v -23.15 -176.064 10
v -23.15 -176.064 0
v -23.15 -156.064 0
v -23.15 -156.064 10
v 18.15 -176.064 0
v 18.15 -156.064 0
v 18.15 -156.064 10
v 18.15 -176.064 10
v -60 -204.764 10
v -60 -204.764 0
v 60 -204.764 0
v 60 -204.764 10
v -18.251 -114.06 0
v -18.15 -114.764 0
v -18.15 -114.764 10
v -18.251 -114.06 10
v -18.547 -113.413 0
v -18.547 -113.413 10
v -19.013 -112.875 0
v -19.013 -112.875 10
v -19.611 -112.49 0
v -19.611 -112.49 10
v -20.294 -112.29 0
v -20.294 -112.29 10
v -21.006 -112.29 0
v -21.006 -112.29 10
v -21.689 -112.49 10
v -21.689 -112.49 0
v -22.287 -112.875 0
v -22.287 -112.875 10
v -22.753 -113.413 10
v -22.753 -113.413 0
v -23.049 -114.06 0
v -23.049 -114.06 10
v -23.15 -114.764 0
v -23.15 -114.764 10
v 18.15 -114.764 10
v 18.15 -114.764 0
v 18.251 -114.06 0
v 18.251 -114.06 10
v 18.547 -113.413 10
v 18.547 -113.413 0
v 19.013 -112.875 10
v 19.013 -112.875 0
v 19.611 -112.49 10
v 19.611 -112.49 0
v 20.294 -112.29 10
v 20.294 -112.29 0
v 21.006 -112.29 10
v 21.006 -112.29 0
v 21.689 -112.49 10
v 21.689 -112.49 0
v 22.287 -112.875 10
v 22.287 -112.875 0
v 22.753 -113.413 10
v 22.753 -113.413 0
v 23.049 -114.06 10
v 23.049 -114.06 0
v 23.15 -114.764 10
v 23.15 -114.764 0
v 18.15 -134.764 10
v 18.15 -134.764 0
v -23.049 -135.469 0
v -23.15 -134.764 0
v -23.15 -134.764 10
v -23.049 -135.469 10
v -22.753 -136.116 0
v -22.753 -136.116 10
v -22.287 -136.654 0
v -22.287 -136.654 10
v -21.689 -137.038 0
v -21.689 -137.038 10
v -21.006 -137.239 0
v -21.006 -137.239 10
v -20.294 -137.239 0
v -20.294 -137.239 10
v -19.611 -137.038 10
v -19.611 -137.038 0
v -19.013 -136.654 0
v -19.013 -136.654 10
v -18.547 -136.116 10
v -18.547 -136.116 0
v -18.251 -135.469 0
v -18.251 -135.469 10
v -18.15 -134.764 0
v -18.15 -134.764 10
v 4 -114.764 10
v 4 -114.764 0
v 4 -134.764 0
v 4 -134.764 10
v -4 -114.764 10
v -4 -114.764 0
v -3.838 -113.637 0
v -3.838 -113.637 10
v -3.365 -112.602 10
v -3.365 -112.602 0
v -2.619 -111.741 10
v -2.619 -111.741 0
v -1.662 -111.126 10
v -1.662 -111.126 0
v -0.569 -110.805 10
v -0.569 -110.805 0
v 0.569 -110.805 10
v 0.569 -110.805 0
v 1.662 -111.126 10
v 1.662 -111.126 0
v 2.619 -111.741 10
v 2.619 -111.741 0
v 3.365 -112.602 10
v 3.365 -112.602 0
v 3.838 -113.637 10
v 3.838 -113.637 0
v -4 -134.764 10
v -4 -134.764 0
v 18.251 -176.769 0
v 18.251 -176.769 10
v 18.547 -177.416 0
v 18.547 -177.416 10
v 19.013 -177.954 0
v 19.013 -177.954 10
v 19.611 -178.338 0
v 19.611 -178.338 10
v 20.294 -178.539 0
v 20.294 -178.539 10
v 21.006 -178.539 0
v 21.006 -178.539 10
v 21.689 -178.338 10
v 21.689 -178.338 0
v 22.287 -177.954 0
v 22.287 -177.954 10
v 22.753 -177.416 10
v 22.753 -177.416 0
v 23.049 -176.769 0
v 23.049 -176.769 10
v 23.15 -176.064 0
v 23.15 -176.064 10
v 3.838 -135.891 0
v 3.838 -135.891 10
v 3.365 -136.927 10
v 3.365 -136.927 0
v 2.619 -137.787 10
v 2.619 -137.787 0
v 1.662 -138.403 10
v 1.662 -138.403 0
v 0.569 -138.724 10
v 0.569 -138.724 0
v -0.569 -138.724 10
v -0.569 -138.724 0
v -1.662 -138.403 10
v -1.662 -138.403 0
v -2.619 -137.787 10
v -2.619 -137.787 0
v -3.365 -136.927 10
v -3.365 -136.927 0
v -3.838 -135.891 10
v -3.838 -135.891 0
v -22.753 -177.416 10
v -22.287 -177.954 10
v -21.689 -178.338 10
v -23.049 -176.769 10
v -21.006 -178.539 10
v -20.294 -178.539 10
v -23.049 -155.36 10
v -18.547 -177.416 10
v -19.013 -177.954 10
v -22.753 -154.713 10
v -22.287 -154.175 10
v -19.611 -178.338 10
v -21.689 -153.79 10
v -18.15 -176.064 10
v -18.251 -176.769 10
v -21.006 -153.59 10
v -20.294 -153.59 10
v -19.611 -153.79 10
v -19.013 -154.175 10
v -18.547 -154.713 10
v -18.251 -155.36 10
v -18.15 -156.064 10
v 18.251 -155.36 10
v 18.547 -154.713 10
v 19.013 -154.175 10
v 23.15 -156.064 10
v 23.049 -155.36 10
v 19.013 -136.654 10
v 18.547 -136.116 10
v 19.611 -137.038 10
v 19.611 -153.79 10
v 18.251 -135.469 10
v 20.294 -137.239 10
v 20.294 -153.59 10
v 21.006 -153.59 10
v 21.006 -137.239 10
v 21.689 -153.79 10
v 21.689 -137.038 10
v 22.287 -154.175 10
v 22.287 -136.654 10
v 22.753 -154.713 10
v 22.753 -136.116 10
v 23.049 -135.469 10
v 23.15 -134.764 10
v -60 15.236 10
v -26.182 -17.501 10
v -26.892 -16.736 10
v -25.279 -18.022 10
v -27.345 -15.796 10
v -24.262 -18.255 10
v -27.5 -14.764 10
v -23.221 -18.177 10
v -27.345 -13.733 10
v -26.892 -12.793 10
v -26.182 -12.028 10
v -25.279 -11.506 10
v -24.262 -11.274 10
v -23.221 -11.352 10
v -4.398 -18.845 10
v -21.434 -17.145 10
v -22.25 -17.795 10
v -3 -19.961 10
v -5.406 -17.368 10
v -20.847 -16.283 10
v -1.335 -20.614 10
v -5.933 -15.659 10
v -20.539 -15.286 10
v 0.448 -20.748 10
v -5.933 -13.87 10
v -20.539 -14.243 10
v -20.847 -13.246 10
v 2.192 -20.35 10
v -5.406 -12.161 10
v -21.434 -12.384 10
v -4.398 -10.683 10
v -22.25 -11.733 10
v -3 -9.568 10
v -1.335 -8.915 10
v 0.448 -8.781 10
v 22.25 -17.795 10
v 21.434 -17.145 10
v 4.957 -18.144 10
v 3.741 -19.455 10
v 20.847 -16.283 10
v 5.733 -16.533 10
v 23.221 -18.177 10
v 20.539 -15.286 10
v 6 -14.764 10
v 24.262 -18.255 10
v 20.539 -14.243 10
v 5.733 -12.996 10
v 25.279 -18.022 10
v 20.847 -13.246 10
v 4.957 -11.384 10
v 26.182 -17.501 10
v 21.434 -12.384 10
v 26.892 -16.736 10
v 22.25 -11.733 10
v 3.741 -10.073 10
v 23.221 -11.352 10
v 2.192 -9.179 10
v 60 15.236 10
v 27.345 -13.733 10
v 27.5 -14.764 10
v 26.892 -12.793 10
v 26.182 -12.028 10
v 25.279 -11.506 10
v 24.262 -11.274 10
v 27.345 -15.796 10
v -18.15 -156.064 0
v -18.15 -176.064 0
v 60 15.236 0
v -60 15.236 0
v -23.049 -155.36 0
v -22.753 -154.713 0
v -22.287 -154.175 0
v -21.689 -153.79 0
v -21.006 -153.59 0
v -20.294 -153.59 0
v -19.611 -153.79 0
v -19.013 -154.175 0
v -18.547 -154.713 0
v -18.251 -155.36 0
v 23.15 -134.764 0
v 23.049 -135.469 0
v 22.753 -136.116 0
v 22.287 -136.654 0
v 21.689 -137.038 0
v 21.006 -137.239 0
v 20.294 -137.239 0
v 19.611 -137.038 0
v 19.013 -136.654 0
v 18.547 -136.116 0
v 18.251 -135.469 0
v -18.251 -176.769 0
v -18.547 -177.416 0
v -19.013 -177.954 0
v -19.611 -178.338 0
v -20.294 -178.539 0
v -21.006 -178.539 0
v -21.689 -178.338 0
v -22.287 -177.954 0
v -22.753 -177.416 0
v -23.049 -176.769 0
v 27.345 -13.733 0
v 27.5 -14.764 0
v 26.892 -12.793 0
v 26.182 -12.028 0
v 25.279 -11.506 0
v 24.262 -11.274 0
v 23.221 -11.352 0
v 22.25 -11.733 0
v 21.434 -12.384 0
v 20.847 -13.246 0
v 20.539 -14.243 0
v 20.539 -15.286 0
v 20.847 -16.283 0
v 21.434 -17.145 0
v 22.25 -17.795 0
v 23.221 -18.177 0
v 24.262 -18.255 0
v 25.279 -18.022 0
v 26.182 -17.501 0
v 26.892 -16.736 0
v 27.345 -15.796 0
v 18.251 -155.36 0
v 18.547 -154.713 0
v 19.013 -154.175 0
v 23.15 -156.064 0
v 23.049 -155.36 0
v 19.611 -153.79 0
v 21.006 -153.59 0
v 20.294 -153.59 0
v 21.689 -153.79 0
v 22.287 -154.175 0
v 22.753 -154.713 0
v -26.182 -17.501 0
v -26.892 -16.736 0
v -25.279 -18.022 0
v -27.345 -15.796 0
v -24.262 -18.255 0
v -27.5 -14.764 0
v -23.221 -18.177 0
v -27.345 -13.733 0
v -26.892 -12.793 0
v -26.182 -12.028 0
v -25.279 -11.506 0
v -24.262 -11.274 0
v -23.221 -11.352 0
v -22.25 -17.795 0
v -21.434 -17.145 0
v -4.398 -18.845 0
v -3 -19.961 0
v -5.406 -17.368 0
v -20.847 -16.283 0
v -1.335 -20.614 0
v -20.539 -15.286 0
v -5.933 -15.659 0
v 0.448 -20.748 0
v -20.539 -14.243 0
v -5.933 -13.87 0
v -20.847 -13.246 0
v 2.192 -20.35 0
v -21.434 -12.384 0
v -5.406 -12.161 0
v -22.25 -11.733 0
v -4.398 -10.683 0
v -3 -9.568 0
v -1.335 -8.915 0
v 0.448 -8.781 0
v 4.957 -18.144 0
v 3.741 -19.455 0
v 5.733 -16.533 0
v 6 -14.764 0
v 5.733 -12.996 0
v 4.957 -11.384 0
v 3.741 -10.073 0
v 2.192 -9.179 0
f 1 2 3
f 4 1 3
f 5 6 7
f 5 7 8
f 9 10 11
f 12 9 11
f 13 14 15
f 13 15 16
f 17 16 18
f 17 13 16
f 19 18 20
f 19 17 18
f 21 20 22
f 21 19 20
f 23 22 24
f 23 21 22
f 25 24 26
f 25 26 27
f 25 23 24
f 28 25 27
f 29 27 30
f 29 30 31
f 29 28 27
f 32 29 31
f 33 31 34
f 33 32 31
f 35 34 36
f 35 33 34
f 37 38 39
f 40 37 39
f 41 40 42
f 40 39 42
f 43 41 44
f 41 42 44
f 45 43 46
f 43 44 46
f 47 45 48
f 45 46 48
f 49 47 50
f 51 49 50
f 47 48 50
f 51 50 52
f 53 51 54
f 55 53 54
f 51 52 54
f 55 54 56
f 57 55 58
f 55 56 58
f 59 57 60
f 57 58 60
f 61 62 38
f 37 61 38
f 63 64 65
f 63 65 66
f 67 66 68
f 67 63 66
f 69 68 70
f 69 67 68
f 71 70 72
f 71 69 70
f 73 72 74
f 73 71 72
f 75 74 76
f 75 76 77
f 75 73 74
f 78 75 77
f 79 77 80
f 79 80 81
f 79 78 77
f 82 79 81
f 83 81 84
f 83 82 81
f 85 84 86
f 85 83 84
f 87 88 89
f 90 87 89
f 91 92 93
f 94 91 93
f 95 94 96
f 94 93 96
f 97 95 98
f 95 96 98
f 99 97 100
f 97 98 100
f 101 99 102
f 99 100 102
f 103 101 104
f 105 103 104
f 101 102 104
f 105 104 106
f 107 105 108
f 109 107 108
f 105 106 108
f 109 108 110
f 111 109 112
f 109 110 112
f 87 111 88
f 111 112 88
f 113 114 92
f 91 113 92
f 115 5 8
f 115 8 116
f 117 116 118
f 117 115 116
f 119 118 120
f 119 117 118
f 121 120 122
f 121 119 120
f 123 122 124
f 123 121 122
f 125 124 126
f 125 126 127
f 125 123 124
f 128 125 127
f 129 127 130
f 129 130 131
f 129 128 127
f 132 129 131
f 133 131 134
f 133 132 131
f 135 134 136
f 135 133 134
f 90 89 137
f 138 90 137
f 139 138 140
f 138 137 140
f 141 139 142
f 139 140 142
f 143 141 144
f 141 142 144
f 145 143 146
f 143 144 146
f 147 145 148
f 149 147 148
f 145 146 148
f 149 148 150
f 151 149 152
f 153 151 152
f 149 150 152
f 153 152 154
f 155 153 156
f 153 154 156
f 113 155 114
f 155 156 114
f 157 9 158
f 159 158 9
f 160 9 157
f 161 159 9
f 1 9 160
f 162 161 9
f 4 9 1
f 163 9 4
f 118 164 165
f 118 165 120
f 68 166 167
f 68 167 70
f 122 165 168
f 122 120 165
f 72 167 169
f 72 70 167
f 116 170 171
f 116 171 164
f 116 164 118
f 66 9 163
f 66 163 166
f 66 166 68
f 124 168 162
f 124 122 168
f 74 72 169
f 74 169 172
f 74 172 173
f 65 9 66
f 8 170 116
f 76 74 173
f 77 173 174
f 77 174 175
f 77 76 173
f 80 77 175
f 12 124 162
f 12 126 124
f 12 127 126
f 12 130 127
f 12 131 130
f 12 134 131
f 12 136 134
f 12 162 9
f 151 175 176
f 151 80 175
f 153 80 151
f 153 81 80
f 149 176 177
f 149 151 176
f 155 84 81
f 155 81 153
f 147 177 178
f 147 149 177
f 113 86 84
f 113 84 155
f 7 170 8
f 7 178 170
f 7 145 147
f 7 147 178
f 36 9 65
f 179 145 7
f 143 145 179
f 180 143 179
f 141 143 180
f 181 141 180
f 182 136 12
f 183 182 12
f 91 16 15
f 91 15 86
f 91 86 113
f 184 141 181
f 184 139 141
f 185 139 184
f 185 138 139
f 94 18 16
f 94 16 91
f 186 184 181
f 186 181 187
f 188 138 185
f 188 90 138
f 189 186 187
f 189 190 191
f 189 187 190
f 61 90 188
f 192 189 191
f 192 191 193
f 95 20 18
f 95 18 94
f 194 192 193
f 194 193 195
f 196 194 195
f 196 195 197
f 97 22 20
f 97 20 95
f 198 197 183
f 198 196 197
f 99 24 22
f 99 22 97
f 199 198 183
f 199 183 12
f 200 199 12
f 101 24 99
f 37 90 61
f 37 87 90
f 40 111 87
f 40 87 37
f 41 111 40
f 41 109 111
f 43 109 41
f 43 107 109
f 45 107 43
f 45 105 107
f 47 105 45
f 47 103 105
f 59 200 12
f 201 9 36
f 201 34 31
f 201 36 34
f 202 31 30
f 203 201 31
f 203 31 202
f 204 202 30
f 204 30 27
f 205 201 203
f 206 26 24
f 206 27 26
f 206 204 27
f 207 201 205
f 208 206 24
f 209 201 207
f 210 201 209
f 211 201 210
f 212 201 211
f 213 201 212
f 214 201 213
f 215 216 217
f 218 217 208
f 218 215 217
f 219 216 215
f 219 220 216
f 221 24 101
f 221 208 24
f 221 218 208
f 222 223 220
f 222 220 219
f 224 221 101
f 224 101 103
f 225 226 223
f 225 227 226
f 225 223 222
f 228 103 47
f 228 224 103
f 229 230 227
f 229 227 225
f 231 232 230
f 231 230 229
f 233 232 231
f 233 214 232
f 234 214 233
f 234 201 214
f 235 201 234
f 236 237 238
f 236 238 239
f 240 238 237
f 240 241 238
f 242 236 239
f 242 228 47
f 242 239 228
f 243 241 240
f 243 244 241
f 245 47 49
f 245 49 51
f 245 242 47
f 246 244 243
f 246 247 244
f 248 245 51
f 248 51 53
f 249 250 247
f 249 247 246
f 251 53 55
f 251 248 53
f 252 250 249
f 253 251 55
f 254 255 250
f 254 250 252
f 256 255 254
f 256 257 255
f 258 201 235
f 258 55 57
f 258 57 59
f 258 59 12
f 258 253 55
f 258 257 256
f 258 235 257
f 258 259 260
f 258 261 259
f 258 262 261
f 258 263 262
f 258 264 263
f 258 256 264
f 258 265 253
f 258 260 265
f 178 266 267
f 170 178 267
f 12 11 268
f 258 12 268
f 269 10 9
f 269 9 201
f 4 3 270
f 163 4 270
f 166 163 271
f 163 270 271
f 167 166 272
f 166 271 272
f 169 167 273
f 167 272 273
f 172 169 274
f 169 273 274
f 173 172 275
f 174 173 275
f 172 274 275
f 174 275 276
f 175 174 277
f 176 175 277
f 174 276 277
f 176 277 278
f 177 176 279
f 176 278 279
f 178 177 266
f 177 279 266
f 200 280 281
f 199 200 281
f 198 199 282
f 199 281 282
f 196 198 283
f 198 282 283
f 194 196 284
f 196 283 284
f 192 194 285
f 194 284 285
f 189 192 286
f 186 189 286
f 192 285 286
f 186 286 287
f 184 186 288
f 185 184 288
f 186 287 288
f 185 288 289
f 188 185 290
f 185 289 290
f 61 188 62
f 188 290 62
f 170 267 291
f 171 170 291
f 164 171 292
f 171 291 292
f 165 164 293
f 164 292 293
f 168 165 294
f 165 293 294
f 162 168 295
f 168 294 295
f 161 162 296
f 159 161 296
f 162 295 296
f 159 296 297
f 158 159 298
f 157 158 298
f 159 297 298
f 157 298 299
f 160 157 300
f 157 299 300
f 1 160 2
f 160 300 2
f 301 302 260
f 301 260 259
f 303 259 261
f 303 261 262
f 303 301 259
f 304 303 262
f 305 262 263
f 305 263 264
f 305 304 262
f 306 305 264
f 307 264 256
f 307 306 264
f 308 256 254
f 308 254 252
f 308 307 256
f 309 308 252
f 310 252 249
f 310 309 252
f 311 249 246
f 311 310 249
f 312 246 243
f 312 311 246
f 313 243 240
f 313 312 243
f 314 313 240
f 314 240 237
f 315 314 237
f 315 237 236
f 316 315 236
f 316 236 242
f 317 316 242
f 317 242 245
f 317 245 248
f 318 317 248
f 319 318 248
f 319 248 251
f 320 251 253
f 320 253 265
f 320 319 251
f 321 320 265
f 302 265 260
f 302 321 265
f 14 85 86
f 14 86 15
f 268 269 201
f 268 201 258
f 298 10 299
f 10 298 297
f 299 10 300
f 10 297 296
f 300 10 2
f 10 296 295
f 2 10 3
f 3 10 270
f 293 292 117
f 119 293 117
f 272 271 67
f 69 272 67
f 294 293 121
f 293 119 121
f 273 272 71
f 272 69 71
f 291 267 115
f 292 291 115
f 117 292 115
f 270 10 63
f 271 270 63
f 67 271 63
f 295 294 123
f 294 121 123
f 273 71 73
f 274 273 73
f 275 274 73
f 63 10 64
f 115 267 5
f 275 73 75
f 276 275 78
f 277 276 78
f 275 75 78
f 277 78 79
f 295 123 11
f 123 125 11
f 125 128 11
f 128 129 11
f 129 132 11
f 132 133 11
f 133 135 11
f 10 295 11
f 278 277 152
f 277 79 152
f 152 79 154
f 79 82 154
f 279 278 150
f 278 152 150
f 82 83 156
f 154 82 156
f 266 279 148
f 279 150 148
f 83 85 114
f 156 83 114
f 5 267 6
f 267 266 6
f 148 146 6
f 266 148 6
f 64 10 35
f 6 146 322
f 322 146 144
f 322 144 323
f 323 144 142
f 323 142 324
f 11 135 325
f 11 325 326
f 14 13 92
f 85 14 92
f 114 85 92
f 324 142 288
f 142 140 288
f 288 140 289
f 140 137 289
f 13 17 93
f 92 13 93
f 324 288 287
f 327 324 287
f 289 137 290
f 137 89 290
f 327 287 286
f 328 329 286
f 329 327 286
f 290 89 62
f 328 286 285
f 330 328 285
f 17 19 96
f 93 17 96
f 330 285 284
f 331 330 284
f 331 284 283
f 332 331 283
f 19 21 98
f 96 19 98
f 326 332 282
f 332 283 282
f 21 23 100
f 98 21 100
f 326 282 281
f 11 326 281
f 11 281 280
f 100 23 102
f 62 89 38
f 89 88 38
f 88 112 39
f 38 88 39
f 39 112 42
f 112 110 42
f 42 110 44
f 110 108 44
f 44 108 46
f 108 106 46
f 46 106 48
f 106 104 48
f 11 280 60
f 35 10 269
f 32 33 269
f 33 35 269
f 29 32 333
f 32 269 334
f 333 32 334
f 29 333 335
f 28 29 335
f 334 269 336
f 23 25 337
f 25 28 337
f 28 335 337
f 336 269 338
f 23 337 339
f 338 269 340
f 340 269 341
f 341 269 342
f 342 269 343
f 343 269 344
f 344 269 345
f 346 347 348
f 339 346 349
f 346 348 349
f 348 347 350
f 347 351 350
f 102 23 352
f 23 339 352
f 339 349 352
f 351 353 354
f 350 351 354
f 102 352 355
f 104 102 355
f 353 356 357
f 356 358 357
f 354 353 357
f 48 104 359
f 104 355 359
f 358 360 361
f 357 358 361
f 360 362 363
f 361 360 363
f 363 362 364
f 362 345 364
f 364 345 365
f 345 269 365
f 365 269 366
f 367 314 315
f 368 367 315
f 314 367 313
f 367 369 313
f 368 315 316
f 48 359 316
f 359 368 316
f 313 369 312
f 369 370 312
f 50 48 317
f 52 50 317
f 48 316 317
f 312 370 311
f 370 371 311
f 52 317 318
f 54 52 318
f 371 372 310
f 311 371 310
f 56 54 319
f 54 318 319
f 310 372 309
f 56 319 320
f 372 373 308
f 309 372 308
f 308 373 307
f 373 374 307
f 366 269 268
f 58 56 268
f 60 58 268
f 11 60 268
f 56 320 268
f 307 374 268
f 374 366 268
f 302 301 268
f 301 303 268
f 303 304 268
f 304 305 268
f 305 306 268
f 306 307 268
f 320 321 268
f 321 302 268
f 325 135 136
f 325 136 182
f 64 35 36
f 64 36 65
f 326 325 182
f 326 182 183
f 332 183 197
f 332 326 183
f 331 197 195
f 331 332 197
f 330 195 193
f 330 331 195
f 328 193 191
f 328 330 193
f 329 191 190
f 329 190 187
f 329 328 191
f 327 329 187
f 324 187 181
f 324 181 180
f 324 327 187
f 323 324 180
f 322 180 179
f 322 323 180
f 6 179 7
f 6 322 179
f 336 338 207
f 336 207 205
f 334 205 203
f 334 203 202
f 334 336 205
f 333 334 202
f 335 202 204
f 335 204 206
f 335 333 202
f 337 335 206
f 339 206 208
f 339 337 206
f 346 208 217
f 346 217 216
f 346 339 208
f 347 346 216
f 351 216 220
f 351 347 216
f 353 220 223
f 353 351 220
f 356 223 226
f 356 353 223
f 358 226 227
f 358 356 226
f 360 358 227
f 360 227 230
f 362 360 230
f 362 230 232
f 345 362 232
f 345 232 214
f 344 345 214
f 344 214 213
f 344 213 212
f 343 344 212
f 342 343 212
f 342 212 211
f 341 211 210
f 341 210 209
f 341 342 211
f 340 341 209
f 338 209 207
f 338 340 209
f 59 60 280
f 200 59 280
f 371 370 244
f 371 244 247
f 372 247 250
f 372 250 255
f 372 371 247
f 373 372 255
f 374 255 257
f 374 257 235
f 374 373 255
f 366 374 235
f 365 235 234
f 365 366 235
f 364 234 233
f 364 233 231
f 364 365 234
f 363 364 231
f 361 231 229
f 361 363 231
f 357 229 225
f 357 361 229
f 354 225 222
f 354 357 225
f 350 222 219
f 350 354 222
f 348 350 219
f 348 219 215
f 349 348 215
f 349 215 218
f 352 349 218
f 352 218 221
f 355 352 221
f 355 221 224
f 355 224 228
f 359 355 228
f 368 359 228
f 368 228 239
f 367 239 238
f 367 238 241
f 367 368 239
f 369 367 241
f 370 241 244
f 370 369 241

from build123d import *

# Parameters (mm, degrees)
SKETCH1_W           = 120
SKETCH1_H           = 220
SKETCH1_R           = 6
SKETCH1_R_2         = 3.5
BOSS_EXTRUDE1_DEPTH = 10


with BuildPart() as part:
    # Sketch1 → Boss-Extrude1 (new body)
    with BuildSketch(Plane.XY):
        with Locations((0, -94.764397906)):
            Rectangle(SKETCH1_W, SKETCH1_H)
        with Locations((0, -14.764397906)):
            Circle(SKETCH1_R, mode=Mode.SUBTRACT)
        with Locations((24, -14.764397906)):
            Circle(SKETCH1_R_2, mode=Mode.SUBTRACT)
        with Locations(Location((-24, -14.764397906, 0), (0, 0, 180))):
            Circle(SKETCH1_R_2, mode=Mode.SUBTRACT)
        with BuildLine():
            Line((4, -114.764397906), (4, -134.764397906))
            ThreePointArc((4, -134.764397906), (0, -138.764397906), (-4, -134.764397906))
            Line((-4, -134.764397906), (-4, -114.764397906))
            ThreePointArc((-4, -114.764397906), (0, -110.764397906), (4, -114.764397906))
        make_face(mode=Mode.SUBTRACT)
        with BuildLine():
            Line((23.15, -114.764397906), (23.15, -134.764397906))
            ThreePointArc((23.15, -134.764397906), (20.65, -137.264397906), (18.15, -134.764397906))
            Line((18.15, -134.764397906), (18.15, -114.764397906))
            ThreePointArc((18.15, -114.764397906), (20.65, -112.264397906), (23.15, -114.764397906))
        make_face(mode=Mode.SUBTRACT)
        with BuildLine():
            Line((-23.15, -114.764397906), (-23.15, -134.764397906))
            ThreePointArc((-23.15, -134.764397906), (-20.65, -137.264397906), (-18.15, -134.764397906))
            Line((-18.15, -134.764397906), (-18.15, -114.764397906))
            ThreePointArc((-18.15, -114.764397906), (-20.65, -112.264397906), (-23.15, -114.764397906))
        make_face(mode=Mode.SUBTRACT)
        with BuildLine():
            Line((-23.15, -176.064397906), (-23.15, -156.064397906))
            ThreePointArc((-23.15, -156.064397906), (-20.65, -153.564397906), (-18.15, -156.064397906))
            Line((-18.15, -156.064397906), (-18.15, -176.064397906))
            ThreePointArc((-18.15, -176.064397906), (-20.65, -178.564397906), (-23.15, -176.064397906))
        make_face(mode=Mode.SUBTRACT)
        with BuildLine():
            Line((23.15, -176.064397906), (23.15, -156.064397906))
            ThreePointArc((23.15, -156.064397906), (20.65, -153.564397906), (18.15, -156.064397906))
            Line((18.15, -156.064397906), (18.15, -176.064397906))
            ThreePointArc((18.15, -176.064397906), (20.65, -178.564397906), (23.15, -176.064397906))
        make_face(mode=Mode.SUBTRACT)
    extrude(amount=BOSS_EXTRUDE1_DEPTH)


solid = part.part
